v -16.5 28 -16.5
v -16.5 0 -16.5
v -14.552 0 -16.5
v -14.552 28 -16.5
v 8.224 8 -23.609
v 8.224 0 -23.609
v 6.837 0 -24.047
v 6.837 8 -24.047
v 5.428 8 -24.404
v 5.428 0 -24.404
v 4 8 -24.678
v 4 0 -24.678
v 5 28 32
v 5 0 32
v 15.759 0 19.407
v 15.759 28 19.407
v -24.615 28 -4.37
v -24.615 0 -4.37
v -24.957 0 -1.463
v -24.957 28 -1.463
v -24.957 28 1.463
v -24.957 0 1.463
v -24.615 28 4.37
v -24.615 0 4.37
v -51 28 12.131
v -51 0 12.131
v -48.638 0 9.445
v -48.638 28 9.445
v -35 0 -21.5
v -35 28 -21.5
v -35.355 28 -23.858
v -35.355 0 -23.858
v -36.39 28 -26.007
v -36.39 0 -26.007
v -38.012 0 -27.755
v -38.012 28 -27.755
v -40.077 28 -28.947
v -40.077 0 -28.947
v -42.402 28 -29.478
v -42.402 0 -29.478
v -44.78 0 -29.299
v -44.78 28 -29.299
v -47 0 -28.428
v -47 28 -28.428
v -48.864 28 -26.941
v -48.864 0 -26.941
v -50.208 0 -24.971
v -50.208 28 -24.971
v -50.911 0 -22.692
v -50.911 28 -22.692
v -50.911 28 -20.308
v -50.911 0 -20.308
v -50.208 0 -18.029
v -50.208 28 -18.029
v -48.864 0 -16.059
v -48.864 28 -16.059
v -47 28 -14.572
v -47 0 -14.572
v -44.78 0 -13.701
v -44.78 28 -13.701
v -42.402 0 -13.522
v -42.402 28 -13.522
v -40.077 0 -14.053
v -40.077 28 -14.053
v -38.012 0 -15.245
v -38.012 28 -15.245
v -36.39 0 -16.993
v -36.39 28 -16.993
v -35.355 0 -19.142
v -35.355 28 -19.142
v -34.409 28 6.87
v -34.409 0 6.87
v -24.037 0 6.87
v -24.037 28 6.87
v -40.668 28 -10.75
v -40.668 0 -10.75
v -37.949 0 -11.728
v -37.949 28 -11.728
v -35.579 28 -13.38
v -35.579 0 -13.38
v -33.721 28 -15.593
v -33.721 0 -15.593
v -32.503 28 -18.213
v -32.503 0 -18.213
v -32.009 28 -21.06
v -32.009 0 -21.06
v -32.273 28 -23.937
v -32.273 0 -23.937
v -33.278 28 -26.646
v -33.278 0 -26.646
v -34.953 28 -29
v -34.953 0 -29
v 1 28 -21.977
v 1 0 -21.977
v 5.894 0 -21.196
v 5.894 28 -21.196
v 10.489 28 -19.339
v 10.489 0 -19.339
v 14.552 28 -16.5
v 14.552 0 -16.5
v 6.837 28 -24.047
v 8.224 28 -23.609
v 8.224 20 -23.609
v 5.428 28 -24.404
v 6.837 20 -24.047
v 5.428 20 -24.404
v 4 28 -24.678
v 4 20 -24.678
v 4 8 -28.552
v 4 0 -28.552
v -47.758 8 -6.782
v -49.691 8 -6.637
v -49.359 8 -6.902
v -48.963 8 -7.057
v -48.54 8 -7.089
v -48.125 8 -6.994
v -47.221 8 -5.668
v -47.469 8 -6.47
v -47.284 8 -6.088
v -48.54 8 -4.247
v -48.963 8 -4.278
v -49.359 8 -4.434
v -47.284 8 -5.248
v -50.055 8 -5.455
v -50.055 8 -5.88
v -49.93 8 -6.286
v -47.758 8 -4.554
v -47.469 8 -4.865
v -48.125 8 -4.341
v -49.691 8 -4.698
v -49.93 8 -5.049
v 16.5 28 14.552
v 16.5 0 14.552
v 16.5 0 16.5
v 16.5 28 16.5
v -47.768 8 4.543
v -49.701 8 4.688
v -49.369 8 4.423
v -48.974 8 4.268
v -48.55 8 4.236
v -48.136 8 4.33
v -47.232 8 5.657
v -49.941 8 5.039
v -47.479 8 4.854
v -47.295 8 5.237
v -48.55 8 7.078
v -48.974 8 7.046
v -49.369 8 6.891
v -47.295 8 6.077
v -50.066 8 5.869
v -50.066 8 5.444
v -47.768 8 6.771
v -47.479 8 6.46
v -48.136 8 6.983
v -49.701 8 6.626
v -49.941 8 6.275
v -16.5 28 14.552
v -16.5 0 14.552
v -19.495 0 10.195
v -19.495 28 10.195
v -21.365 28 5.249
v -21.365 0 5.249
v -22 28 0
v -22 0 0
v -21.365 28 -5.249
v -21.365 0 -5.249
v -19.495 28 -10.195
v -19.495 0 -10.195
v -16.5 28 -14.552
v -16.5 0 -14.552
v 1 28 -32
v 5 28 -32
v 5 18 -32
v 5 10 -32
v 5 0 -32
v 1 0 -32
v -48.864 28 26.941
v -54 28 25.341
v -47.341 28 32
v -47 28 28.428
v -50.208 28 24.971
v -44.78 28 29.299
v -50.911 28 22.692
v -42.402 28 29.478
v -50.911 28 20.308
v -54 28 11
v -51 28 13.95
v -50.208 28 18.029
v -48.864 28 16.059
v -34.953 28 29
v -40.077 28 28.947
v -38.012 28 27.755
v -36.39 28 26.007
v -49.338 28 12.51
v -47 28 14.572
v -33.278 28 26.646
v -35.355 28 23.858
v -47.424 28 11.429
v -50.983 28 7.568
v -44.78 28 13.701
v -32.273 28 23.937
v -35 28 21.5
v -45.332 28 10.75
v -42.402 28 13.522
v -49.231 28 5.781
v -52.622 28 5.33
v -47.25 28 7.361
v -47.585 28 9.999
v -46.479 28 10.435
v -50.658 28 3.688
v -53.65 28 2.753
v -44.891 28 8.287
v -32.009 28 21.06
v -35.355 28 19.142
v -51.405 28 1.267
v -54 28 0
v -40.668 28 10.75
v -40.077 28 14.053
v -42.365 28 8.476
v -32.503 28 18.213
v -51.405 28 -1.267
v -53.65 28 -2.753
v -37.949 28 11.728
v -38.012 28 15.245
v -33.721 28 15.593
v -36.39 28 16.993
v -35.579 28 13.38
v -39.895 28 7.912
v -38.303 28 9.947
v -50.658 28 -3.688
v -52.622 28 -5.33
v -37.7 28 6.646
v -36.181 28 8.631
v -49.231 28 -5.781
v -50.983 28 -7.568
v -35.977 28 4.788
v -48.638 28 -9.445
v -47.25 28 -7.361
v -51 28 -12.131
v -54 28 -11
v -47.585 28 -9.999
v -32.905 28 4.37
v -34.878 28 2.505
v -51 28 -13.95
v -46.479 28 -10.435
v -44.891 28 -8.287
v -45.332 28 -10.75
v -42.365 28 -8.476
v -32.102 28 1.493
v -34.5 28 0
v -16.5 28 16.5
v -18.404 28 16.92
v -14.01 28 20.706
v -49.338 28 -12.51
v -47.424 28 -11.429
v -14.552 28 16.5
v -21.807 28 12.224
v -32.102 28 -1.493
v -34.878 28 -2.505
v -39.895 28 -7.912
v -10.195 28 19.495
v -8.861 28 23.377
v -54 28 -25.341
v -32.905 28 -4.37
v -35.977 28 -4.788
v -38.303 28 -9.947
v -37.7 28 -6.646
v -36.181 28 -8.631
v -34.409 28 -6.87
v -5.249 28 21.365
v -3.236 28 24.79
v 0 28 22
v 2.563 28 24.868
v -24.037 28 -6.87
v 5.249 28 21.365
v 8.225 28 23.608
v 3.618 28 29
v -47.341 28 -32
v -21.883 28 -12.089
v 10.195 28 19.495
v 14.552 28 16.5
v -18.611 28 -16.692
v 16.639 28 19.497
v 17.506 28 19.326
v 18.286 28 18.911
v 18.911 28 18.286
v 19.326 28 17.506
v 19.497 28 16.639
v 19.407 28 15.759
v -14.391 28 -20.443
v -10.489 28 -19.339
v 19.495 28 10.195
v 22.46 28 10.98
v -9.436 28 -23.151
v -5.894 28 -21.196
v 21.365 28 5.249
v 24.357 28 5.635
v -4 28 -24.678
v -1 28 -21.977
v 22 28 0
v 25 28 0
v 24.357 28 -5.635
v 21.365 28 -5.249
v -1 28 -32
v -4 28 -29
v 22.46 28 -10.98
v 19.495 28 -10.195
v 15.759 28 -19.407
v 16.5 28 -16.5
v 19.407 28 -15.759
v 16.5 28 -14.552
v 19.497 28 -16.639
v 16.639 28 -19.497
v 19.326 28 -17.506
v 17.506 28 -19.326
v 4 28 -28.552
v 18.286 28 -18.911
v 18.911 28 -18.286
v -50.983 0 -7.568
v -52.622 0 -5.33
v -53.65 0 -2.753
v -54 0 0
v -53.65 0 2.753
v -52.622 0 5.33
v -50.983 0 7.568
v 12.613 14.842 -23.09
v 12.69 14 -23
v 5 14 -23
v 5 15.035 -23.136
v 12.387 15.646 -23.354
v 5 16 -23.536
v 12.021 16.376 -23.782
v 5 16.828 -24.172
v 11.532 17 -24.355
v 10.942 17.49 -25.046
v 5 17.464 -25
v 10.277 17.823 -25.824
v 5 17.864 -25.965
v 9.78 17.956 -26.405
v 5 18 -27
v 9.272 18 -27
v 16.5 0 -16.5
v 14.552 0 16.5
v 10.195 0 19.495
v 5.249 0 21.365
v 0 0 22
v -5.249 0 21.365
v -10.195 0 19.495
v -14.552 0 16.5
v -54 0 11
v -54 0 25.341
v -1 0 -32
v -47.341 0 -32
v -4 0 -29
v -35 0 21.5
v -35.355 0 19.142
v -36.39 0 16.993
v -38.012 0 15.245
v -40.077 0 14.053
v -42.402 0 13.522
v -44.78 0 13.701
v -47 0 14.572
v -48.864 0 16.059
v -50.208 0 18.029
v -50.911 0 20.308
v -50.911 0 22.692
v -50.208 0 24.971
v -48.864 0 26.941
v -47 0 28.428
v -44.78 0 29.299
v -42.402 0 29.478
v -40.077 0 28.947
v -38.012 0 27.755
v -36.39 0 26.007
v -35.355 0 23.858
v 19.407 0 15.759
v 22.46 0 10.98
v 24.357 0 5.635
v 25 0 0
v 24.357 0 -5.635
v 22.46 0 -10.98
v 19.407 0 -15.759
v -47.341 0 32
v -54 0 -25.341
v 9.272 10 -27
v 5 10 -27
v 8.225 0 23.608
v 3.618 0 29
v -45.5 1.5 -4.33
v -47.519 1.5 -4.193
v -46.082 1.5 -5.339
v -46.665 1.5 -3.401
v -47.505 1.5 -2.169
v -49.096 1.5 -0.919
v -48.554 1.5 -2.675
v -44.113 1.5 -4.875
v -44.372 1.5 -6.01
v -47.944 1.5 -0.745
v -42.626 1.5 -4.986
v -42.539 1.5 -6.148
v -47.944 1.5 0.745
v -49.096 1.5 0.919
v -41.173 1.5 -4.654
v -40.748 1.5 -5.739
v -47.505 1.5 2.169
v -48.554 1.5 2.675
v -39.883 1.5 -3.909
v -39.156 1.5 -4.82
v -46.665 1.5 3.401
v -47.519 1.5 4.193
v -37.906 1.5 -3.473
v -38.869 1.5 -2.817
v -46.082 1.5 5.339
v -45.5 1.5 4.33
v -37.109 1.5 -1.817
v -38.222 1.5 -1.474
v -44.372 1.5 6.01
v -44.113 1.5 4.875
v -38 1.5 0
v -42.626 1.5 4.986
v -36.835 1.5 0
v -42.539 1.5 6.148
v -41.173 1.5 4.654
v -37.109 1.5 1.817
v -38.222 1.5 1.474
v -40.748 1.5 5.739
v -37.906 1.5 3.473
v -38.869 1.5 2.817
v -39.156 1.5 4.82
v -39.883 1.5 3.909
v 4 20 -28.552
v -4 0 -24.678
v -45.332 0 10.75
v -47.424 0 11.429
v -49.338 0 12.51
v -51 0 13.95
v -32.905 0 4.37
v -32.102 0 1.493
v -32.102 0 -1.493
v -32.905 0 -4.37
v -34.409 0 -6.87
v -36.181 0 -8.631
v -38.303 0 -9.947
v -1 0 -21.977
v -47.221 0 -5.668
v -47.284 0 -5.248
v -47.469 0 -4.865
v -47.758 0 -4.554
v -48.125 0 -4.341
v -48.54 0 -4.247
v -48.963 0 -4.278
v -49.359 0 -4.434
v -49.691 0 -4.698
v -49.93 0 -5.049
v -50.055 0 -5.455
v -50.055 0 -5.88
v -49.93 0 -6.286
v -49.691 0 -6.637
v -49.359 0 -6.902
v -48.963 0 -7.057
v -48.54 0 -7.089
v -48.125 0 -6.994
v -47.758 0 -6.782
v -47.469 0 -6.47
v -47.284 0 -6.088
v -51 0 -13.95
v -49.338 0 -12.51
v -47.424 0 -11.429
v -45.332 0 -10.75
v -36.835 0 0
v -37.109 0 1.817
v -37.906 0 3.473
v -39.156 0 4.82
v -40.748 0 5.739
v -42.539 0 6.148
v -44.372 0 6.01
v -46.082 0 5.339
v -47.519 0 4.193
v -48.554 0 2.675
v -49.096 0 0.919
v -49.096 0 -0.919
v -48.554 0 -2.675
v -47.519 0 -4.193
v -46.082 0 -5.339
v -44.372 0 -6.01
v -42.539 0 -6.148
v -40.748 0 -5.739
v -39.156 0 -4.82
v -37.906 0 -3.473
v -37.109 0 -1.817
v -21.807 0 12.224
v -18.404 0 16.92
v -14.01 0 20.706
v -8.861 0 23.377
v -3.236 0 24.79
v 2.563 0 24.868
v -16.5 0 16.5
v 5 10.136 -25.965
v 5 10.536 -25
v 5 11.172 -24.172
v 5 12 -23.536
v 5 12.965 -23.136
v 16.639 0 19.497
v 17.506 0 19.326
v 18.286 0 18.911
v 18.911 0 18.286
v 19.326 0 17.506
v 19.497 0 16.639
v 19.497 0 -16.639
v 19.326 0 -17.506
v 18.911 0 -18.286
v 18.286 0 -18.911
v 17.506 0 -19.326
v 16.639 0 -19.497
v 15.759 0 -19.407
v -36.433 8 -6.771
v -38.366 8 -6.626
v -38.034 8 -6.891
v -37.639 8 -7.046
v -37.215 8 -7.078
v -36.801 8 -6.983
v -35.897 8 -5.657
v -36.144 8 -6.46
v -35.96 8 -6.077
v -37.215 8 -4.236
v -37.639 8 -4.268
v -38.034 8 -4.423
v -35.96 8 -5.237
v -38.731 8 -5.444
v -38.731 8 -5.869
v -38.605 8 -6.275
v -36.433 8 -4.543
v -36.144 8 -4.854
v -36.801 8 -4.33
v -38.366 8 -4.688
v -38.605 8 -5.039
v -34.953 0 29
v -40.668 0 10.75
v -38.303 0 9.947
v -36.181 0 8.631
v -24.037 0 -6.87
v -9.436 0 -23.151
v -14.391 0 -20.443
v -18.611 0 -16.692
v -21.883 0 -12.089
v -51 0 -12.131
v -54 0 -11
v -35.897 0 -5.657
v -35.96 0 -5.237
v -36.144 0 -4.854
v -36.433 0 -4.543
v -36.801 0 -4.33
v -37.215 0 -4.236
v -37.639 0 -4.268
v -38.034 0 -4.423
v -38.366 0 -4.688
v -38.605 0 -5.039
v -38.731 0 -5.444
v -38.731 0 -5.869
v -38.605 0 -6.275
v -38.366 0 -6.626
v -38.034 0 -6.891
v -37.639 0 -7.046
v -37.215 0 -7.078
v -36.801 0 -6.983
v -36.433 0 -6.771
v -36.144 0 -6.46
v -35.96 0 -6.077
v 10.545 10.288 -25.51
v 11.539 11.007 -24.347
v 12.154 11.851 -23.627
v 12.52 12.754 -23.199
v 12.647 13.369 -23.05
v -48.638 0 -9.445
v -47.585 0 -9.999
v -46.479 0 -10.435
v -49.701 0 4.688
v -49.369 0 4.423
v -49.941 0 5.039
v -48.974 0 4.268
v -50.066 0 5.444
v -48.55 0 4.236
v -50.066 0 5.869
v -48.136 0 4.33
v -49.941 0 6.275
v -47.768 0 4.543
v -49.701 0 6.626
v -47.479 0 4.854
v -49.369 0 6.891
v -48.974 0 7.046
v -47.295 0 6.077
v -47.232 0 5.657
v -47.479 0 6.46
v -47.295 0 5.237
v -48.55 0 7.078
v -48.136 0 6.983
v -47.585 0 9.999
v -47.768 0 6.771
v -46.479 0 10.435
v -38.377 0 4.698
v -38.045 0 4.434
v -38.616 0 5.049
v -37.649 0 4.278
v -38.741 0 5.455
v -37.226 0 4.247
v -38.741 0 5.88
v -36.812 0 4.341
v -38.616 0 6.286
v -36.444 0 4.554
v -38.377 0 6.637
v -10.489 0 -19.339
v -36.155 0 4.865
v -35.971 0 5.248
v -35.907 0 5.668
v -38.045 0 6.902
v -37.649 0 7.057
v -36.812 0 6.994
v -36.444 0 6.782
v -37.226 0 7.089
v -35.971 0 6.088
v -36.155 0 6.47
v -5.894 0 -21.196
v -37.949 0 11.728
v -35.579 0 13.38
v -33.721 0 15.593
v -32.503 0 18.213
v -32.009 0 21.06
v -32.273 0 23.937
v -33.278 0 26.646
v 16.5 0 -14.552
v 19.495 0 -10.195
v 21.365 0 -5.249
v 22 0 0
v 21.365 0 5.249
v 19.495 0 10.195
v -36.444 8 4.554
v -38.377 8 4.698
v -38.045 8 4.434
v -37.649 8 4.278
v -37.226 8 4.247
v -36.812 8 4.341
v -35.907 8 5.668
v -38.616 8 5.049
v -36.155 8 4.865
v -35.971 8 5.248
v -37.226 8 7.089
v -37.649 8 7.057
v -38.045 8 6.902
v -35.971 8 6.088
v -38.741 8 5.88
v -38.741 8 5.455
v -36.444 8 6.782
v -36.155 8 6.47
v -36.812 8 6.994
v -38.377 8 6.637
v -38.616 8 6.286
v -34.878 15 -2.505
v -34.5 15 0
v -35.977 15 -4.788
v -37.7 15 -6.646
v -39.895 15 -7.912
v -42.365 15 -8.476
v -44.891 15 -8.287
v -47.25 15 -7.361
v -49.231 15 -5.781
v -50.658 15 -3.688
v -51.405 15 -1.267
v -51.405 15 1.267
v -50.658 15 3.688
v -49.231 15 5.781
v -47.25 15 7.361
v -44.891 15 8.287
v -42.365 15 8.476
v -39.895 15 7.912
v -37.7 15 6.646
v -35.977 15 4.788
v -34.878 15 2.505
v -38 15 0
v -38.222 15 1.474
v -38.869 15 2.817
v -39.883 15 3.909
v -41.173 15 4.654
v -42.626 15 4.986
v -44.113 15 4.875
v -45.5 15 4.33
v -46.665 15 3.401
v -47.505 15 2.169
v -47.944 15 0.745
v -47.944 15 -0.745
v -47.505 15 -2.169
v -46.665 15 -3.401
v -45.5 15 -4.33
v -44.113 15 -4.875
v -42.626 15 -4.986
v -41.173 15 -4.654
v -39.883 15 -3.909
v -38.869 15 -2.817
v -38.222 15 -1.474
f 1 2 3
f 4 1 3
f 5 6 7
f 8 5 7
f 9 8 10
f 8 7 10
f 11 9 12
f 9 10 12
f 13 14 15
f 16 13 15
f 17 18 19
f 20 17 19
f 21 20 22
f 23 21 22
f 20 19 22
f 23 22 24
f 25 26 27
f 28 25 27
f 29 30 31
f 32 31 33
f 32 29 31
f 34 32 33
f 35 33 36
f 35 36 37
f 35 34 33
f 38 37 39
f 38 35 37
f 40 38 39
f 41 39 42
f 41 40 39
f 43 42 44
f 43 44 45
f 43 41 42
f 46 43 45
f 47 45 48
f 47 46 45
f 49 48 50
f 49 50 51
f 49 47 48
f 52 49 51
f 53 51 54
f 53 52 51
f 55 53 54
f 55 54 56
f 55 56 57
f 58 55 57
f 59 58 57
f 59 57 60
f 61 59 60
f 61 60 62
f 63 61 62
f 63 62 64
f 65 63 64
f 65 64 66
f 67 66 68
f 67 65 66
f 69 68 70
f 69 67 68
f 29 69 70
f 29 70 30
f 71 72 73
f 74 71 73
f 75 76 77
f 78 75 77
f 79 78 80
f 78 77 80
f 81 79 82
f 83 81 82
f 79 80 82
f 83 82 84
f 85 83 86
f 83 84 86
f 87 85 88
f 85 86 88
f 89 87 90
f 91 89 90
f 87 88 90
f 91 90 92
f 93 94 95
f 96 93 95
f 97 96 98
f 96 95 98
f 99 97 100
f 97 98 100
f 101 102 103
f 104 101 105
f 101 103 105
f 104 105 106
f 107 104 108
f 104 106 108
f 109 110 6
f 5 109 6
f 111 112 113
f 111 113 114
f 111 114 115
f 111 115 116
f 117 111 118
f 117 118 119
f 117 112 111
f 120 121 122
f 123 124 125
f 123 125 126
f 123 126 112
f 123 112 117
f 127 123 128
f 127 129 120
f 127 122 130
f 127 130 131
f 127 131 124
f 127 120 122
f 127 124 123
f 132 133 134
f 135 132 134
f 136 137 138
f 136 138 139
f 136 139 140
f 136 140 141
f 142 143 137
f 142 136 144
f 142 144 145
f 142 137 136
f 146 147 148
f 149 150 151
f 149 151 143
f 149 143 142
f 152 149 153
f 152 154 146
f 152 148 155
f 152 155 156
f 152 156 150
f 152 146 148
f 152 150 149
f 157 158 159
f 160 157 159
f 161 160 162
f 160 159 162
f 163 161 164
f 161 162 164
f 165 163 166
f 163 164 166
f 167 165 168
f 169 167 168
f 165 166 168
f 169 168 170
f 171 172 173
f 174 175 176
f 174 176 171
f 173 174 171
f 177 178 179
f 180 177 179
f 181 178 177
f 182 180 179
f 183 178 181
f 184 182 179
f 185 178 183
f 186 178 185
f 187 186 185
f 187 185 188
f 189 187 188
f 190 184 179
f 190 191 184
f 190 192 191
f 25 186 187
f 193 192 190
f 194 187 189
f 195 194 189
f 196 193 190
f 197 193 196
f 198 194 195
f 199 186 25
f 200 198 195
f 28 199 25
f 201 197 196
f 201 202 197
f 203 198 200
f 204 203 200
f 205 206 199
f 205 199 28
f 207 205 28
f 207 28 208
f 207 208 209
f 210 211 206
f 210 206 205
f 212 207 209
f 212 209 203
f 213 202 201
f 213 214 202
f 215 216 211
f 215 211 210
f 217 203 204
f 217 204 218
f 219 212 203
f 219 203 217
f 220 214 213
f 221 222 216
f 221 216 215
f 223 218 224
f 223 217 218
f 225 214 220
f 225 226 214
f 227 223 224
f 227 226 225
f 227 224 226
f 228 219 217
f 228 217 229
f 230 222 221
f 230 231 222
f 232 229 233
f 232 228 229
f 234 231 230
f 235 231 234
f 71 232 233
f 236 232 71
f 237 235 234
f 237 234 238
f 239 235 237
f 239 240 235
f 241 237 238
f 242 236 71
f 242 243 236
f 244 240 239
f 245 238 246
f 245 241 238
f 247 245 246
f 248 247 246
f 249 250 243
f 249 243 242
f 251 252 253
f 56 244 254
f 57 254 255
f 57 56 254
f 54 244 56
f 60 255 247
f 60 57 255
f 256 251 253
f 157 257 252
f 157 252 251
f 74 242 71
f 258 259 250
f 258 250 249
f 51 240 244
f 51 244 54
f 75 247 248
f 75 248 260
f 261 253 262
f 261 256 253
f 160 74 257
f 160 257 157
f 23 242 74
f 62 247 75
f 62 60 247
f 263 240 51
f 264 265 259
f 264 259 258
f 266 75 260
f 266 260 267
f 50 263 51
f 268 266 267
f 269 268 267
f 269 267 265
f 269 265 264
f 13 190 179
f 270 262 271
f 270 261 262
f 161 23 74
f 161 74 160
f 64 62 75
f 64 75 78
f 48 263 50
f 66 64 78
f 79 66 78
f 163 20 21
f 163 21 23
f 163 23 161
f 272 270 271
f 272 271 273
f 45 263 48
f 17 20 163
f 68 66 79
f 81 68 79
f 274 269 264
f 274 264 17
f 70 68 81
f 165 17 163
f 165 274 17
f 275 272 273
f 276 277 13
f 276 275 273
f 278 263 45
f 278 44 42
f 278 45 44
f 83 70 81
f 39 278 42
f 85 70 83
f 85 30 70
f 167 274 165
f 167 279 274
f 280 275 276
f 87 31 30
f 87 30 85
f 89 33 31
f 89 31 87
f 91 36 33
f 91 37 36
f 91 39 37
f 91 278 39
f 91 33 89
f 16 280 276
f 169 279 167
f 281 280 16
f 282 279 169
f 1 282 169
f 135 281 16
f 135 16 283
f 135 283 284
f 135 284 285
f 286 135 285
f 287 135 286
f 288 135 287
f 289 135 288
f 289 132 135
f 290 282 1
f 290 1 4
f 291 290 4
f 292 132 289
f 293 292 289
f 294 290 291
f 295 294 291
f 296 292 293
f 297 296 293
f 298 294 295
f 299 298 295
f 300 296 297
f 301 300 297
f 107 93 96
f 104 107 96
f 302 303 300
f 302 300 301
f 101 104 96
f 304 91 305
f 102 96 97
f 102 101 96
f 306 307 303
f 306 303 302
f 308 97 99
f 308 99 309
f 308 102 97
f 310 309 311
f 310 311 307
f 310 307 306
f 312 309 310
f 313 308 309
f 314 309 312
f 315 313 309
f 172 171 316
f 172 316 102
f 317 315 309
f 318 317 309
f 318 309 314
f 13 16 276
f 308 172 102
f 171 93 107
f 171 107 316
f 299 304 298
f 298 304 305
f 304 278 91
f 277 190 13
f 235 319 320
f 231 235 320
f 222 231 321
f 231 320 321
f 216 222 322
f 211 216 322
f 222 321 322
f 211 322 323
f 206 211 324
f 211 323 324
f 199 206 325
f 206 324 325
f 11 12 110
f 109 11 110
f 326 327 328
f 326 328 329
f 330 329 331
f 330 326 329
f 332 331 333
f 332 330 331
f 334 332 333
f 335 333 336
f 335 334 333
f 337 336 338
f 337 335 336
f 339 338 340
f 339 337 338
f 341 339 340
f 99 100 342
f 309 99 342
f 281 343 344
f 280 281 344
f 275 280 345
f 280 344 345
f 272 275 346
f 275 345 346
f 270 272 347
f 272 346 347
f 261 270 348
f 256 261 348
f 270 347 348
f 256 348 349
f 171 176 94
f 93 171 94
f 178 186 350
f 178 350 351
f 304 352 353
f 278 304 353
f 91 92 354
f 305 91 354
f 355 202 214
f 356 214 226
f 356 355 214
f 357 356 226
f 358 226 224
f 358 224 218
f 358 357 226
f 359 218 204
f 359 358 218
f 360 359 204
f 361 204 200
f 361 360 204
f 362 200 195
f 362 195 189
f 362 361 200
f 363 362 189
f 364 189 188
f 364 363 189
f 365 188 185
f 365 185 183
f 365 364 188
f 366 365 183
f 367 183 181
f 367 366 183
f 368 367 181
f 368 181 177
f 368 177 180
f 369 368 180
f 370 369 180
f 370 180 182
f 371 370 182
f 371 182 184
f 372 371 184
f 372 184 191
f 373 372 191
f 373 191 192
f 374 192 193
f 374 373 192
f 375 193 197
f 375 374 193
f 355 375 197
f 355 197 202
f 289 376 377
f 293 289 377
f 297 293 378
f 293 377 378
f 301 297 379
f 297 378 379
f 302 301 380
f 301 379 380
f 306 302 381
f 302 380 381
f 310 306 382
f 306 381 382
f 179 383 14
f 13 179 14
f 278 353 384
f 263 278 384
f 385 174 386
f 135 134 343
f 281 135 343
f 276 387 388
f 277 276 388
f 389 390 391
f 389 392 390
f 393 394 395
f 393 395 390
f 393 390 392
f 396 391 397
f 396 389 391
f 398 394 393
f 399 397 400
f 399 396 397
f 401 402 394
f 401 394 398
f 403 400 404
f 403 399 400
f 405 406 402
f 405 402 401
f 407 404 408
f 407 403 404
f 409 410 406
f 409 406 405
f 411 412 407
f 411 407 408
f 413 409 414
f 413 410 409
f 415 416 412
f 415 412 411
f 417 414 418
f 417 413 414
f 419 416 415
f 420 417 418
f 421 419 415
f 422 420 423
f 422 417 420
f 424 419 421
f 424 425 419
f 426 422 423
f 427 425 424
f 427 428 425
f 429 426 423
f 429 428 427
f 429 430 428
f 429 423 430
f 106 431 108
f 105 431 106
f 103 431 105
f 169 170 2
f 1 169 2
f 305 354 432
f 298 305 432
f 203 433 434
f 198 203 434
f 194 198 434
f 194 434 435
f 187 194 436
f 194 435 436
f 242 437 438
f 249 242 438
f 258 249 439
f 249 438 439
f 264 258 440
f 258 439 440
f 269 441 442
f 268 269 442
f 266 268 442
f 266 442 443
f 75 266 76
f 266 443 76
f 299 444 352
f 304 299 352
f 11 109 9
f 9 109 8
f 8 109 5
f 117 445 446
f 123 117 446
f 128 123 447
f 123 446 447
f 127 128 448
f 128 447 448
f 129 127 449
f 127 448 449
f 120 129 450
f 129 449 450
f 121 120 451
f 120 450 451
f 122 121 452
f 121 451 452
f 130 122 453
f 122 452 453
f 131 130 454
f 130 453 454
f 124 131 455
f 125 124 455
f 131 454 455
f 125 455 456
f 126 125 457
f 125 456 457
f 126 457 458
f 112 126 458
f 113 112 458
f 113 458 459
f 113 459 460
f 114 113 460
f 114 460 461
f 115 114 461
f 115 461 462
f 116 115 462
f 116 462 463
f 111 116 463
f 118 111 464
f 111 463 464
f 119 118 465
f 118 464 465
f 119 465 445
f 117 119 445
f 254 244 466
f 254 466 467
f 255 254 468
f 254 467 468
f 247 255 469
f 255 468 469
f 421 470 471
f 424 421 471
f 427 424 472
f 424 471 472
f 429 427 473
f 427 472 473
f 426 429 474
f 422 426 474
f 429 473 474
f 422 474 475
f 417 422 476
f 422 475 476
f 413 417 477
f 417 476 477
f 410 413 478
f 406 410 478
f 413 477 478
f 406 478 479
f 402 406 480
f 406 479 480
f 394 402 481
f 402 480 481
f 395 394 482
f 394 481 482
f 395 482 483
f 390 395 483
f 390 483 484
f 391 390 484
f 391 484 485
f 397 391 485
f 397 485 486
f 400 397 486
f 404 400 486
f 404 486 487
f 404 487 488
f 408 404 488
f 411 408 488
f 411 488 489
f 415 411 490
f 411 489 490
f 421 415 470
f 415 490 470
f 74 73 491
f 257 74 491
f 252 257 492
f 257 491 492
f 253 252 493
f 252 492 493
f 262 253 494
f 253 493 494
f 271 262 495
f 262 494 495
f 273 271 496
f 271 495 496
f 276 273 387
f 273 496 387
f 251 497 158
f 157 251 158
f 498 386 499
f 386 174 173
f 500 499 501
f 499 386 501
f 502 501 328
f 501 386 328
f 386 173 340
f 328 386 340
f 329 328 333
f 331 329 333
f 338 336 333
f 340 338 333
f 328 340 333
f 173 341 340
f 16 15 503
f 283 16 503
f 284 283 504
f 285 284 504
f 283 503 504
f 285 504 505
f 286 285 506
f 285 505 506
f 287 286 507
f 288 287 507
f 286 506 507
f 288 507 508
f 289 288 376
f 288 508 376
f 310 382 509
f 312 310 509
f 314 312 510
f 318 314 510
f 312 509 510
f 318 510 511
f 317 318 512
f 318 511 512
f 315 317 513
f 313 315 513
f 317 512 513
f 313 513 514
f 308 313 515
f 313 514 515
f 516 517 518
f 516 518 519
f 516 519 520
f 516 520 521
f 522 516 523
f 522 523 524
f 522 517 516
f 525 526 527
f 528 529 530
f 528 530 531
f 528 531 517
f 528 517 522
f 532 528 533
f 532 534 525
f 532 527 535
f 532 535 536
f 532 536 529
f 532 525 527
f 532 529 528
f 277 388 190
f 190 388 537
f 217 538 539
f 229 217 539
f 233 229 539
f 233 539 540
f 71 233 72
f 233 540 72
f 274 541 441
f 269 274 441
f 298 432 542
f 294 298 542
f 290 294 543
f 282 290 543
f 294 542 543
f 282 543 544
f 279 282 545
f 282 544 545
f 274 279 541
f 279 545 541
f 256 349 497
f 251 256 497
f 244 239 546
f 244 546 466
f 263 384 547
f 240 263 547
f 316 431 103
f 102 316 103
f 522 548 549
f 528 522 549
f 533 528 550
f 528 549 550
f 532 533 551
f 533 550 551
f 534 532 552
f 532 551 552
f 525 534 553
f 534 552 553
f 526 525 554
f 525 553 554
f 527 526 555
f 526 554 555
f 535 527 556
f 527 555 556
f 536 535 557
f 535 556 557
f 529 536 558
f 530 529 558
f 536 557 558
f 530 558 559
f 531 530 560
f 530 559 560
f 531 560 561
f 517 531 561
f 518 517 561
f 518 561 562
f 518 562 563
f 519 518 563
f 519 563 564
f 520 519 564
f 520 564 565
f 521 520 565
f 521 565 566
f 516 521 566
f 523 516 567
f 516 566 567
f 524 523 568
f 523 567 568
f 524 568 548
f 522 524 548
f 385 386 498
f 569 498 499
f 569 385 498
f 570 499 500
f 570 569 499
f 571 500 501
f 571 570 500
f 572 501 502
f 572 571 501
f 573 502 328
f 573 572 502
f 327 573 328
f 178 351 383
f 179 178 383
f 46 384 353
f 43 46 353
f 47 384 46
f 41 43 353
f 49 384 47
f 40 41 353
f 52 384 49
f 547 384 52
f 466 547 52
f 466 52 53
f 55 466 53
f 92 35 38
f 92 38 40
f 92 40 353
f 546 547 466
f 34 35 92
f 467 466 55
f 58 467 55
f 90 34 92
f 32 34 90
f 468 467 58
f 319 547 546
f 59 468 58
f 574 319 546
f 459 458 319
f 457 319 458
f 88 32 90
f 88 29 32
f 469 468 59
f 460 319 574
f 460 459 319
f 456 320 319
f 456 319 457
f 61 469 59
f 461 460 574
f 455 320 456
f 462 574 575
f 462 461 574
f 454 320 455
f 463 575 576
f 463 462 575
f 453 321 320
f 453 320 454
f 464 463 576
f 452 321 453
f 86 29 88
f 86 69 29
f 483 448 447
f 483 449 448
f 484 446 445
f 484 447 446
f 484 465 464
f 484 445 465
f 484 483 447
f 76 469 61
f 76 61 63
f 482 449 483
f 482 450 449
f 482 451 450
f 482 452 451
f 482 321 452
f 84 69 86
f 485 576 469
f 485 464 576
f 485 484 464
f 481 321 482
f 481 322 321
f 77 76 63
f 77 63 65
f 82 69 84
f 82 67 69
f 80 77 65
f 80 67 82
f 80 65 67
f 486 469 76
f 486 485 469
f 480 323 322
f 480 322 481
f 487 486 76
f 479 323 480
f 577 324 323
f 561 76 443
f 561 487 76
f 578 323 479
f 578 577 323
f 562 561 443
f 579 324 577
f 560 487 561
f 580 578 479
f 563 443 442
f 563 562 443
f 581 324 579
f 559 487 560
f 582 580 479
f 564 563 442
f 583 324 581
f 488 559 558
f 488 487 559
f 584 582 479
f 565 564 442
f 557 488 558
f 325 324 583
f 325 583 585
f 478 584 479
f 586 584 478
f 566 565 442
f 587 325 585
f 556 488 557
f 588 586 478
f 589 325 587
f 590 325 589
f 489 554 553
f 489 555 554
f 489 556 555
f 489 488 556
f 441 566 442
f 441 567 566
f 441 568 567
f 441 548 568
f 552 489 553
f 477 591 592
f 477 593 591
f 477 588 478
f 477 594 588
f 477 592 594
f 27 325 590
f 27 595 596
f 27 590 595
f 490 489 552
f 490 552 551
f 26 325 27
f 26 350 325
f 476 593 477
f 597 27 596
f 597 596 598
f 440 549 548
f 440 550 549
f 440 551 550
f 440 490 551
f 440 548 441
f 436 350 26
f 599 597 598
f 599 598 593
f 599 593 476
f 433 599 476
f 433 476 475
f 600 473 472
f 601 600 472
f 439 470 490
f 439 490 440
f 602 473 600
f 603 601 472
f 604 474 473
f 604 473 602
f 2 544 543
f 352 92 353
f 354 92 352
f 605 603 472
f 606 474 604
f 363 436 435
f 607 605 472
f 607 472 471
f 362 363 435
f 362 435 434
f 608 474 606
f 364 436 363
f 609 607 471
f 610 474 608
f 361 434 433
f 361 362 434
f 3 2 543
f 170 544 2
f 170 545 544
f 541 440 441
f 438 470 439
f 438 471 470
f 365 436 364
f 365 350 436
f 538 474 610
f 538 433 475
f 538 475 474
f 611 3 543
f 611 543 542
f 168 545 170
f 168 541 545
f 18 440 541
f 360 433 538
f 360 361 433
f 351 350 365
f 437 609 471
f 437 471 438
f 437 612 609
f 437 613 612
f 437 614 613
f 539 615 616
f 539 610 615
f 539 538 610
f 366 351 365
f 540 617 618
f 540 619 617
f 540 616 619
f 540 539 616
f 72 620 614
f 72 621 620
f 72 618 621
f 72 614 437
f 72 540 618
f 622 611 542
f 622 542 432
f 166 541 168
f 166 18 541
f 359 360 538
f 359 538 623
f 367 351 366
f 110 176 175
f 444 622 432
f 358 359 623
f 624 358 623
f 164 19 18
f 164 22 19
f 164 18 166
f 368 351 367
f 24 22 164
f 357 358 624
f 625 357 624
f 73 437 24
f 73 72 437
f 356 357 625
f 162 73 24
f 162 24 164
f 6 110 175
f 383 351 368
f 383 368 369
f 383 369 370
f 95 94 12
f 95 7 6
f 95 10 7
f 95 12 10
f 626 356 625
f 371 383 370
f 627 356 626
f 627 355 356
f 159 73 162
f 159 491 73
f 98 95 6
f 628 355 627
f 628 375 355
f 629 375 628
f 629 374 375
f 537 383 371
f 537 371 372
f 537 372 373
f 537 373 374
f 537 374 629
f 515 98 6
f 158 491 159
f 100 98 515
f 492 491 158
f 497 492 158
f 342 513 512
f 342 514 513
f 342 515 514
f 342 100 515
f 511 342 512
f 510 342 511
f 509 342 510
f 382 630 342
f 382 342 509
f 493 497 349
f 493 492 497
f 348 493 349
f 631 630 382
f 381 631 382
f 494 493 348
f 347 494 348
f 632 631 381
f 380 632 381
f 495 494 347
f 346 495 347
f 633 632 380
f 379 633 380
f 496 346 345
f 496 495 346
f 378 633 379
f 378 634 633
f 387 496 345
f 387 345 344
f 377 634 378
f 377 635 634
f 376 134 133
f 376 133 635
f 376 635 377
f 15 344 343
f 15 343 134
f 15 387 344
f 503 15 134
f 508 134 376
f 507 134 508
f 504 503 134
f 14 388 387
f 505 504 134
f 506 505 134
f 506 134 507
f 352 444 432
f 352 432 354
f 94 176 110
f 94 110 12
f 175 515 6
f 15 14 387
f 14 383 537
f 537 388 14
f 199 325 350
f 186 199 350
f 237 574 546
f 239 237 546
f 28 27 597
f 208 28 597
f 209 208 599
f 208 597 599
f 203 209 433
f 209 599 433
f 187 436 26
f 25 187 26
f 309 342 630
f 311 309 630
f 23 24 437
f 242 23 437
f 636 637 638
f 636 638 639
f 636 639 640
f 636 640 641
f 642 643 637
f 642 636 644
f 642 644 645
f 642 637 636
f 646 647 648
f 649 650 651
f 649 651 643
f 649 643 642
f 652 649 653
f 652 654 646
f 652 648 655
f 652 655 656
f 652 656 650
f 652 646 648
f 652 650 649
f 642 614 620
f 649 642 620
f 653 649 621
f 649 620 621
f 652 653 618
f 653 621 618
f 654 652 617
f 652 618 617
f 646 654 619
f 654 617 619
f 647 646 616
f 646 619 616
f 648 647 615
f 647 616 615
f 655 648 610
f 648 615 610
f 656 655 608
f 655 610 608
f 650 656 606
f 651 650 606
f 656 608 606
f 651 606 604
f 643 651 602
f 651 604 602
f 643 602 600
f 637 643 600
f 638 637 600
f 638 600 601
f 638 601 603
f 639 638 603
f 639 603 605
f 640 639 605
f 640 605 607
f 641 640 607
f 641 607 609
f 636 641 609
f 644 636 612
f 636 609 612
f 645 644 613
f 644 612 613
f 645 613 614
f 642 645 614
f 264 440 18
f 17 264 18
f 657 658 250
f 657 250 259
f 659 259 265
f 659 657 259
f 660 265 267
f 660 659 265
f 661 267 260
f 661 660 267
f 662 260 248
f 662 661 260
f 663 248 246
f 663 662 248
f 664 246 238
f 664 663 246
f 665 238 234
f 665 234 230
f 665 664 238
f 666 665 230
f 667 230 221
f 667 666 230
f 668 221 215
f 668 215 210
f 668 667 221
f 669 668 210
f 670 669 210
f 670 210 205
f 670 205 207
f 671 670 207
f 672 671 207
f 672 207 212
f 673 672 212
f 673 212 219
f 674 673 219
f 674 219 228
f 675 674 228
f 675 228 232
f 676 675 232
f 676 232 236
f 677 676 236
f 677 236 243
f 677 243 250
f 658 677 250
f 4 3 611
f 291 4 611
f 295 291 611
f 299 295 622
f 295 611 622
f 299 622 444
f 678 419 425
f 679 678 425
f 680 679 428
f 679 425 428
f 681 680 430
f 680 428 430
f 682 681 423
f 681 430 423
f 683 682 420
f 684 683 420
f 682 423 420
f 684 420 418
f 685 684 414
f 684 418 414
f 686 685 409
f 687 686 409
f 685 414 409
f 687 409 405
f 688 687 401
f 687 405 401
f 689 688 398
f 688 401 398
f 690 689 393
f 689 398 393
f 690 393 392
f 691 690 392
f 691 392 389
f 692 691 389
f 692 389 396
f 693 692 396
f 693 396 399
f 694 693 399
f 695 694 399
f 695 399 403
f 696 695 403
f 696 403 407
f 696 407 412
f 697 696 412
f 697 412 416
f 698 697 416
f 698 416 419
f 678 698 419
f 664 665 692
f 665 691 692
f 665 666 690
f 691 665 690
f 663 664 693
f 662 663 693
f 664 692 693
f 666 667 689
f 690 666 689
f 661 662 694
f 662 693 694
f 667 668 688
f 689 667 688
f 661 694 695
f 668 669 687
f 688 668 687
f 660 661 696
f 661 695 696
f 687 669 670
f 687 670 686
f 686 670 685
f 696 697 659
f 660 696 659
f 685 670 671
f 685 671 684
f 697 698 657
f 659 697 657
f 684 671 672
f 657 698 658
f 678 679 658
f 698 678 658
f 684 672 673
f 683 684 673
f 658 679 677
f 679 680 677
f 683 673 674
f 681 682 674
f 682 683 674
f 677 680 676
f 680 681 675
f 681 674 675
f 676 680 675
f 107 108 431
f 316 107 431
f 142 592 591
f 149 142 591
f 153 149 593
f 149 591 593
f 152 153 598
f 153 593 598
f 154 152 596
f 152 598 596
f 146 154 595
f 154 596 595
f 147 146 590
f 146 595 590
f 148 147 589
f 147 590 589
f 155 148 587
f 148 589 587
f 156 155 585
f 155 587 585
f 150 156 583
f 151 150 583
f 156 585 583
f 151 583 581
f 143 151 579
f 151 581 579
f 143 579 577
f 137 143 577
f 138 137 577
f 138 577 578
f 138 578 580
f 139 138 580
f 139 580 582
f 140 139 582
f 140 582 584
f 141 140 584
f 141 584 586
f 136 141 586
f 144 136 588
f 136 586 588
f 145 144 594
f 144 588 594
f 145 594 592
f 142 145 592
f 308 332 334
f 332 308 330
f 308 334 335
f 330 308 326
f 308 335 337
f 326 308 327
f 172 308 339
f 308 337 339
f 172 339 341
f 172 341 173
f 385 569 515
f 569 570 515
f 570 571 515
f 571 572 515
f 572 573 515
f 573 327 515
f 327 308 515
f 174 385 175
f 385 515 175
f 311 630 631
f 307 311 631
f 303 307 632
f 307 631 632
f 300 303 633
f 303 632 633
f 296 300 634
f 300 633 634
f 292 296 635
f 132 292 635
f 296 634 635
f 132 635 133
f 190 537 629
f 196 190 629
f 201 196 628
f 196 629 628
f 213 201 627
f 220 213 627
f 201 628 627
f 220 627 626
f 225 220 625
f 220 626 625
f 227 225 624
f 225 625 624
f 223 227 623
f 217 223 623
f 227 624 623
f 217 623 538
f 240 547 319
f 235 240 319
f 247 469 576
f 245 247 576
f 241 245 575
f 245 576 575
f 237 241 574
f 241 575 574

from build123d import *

# Parameters (mm, degrees)
SKETCH1_R           = 8
SKETCH1_R_2         = 8.5
BOSS_EXTRUDE1_DEPTH = 28
BOSS_EXTRUDE3_DEPTH = 12
CUT_EXTRUDE1_DEPTH  = 14.407172
SKETCH7_R           = 8.5
BOSS_EXTRUDE4_DEPTH = 15
SKETCH7_3_R         = 5
CUT_EXTRUDE2_DEPTH  = 15
SKETCH7_4_R         = 6.165
CUT_EXTRUDE3_DEPTH  = 1.5
SKETCH7_5_R         = 1.425
CUT_EXTRUDE4_DEPTH  = 8


with BuildPart() as part:
    # Sketch1 → Boss-Extrude1 (new body)
    with BuildSketch(Plane(origin=(0, 0, 0), x_dir=(1, 0, 0), z_dir=(0, 1, 0))):
        with BuildLine():
            ThreePointArc((-50.982546594, 7.568285795), (-54, 0), (-50.982546594, -7.568285795))
            Line((-50.982546594, -7.568285795), (-54, -11))
            Line((-54, -11), (-54, -25.34082208))
            Line((-54, -25.34082208), (-47.34082208, -32))
            Line((-47.34082208, -32), (5, -32))
            Line((5, -32), (15.759494281, -19.407172386))
            ThreePointArc((15.759494281, -19.407172386), (18.621320344, -18.621320344), (19.407172386, -15.759494281))
            ThreePointArc((19.407172386, -15.759494281), (25, 0), (19.407172386, 15.759494281))
            ThreePointArc((19.407172386, 15.759494281), (18.621320344, 18.621320344), (15.759494281, 19.407172386))
            Line((15.759494281, 19.407172386), (5, 32))
            Line((5, 32), (1, 32))
            Line((1, 32), (1, 21.977260976))
            ThreePointArc((1, 21.977260976), (8.243992543, 20.396974946), (14.551632211, 16.5))
            Line((14.551632211, 16.5), (16.5, 16.5))
            Line((16.5, 16.5), (16.5, 14.551632211))
            ThreePointArc((16.5, 14.551632211), (22, 0), (16.5, -14.551632211))
            Line((16.5, -14.551632211), (16.5, -16.5))
            Line((16.5, -16.5), (14.551632211, -16.5))
            ThreePointArc((14.551632211, -16.5), (0, -22), (-14.551632211, -16.5))
            Line((-14.551632211, -16.5), (-16.5, -16.5))
            Line((-16.5, -16.5), (-16.5, -14.551632211))
            ThreePointArc((-16.5, -14.551632211), (-22, 0), (-16.5, 14.551632211))
            Line((-16.5, 14.551632211), (-16.5, 16.5))
            Line((-16.5, 16.5), (-14.551632211, 16.5))
            ThreePointArc((-14.551632211, 16.5), (-8.243992543, 20.396974946), (-1, 21.977260976))
            Line((-1, 21.977260976), (-1, 32))
            Line((-1, 32), (-47.34082208, 32))
            Line((-47.34082208, 32), (-54, 25.34082208))
            Line((-54, 25.34082208), (-54, 11))
            Line((-54, 11), (-50.982546594, 7.568285795))
        make_face()
        with BuildLine():
            ThreePointArc((-48.638105805, -9.445197877), (-47.038026147, -10.232025451), (-45.331844763, -10.75))
            ThreePointArc((-45.331844763, -10.75), (-48.408051309, -11.921222362), (-51, -13.950165565))
            Line((-51, -13.950165565), (-51, -12.131352314))
            Line((-51, -12.131352314), (-48.638105805, -9.445197877))
        make_face(mode=Mode.SUBTRACT)
        with Locations((-43, -21.5)):
            Circle(SKETCH1_R, mode=Mode.SUBTRACT)
        with BuildLine():
            ThreePointArc((-34.95326153, -29), (-32.502649264, -18.212808567), (-40.668155237, -10.75))
            ThreePointArc((-40.668155237, -10.75), (-37.204464997, -9.349426401), (-34.409357086, -6.870287791))
            Line((-34.409357086, -6.870287791), (-24.037452978, -6.870287791))
            ThreePointArc((-24.037452978, -6.870287791), (-11.513133706, -22.191163833), (8.224630177, -23.60837687))
            Line((8.224630177, -23.60837687), (3.617949295, -29))
            Line((3.617949295, -29), (-34.95326153, -29))
        make_face(mode=Mode.SUBTRACT)
        with Locations((-43, 0)):
            Circle(SKETCH1_R_2, mode=Mode.SUBTRACT)
        with BuildLine():
            ThreePointArc((-45.331844763, 10.75), (-47.038026147, 10.232025451), (-48.638105805, 9.445197877))
            Line((-48.638105805, 9.445197877), (-51, 12.131352314))
            Line((-51, 12.131352314), (-51, 13.950165565))
            ThreePointArc((-51, 13.950165565), (-48.408051309, 11.921222362), (-45.331844763, 10.75))
        make_face(mode=Mode.SUBTRACT)
        with BuildLine():
            ThreePointArc((-32.905418056, -4.370287791), (-32, 0), (-32.905418056, 4.370287791))
            Line((-32.905418056, 4.370287791), (-24.615047931, 4.370287791))
            ThreePointArc((-24.615047931, 4.370287791), (-25, 0), (-24.615047931, -4.370287791))
            Line((-24.615047931, -4.370287791), (-32.905418056, -4.370287791))
        make_face(mode=Mode.SUBTRACT)
        with Locations((-43, 21.5)):
            Circle(SKETCH1_R, mode=Mode.SUBTRACT)
        with BuildLine():
            ThreePointArc((-34.409357086, 6.870287791), (-37.204464997, 9.349426401), (-40.668155237, 10.75))
            ThreePointArc((-40.668155237, 10.75), (-32.502649264, 18.212808567), (-34.95326153, 29))
            Line((-34.95326153, 29), (-4, 29))
            Line((-4, 29), (-4, 24.677925359))
            ThreePointArc((-4, 24.677925359), (-16.607308069, 18.68682206), (-24.037452978, 6.870287791))
            Line((-24.037452978, 6.870287791), (-34.409357086, 6.870287791))
        make_face(mode=Mode.SUBTRACT)
        with BuildLine():
            ThreePointArc((8.223751321, 23.608683026), (6.135213434, 24.235493725), (4, 24.677925359))
            Line((4, 24.677925359), (4, 28.552128404))
            Line((4, 28.552128404), (8.223751321, 23.608683026))
        make_face(mode=Mode.SUBTRACT)
    extrude(amount=BOSS_EXTRUDE1_DEPTH)

    # Sketch6 → Boss-Extrude3 (add)
    with BuildSketch(Plane(origin=(0, 20, 0), x_dir=(0, 0, -1), z_dir=(0, -1, 0))):
        Polygon((30.717367885, 3.963704263), (22.785433959, 3.963704263), (22.785433959, 10.604126234), align=None)
    extrude(amount=BOSS_EXTRUDE3_DEPTH)

    # Sketch3 → Cut-Extrude1 (cut)
    with BuildSketch(Plane.ZY.offset(-19.407172386)):
        with BuildLine():
            ThreePointArc((-23, 14), (-24.171572875, 16.828427125), (-27, 18))
            Line((-27, 18), (-27, 10))
            ThreePointArc((-27, 10), (-24.171572875, 11.171572875), (-23, 14))
        make_face()
        with BuildLine():
            Line((-27, 10), (-27, 18))
            ThreePointArc((-27, 18), (-31, 14), (-27, 10))
        make_face()
        with BuildLine():
            Line((-27, 18), (-32, 18))
            Line((-32, 18), (-32, 10))
            Line((-32, 10), (-27, 10))
            ThreePointArc((-27, 10), (-31, 14), (-27, 18))
        make_face()
    extrude(amount=CUT_EXTRUDE1_DEPTH, mode=Mode.SUBTRACT)

    # Sketch7 → Boss-Extrude4 (add)
    with BuildSketch(Plane.XZ):
        with Locations((-43, 0)):
            Circle(SKETCH7_R)
    extrude(amount=-BOSS_EXTRUDE4_DEPTH)

    # Sketch7<3> → Cut-Extrude2 (cut)
    with BuildSketch(Plane.XZ):
        with Locations((-43, 0)):
            Circle(SKETCH7_3_R)
    extrude(amount=-CUT_EXTRUDE2_DEPTH, mode=Mode.SUBTRACT)

    # Sketch7<4> → Cut-Extrude3 (cut)
    with BuildSketch(Plane.XZ):
        with Locations((-43, 0)):
            Circle(SKETCH7_4_R)
    extrude(amount=-CUT_EXTRUDE3_DEPTH, mode=Mode.SUBTRACT)

    # Sketch7<5> → Cut-Extrude4 (cut)
    with BuildSketch(Plane.XZ):
        with Locations((-48.64603005, -5.667657777)):
            Circle(SKETCH7_5_R)
        with Locations((-48.656854249, 5.656854249)):
            Circle(SKETCH7_5_R)
        with Locations((-37.332342223, 5.667678449)):
            Circle(SKETCH7_5_R)
        with Locations((-37.321518023, -5.656833577)):
            Circle(SKETCH7_5_R)
    extrude(amount=-CUT_EXTRUDE4_DEPTH, mode=Mode.SUBTRACT)


solid = part.part
